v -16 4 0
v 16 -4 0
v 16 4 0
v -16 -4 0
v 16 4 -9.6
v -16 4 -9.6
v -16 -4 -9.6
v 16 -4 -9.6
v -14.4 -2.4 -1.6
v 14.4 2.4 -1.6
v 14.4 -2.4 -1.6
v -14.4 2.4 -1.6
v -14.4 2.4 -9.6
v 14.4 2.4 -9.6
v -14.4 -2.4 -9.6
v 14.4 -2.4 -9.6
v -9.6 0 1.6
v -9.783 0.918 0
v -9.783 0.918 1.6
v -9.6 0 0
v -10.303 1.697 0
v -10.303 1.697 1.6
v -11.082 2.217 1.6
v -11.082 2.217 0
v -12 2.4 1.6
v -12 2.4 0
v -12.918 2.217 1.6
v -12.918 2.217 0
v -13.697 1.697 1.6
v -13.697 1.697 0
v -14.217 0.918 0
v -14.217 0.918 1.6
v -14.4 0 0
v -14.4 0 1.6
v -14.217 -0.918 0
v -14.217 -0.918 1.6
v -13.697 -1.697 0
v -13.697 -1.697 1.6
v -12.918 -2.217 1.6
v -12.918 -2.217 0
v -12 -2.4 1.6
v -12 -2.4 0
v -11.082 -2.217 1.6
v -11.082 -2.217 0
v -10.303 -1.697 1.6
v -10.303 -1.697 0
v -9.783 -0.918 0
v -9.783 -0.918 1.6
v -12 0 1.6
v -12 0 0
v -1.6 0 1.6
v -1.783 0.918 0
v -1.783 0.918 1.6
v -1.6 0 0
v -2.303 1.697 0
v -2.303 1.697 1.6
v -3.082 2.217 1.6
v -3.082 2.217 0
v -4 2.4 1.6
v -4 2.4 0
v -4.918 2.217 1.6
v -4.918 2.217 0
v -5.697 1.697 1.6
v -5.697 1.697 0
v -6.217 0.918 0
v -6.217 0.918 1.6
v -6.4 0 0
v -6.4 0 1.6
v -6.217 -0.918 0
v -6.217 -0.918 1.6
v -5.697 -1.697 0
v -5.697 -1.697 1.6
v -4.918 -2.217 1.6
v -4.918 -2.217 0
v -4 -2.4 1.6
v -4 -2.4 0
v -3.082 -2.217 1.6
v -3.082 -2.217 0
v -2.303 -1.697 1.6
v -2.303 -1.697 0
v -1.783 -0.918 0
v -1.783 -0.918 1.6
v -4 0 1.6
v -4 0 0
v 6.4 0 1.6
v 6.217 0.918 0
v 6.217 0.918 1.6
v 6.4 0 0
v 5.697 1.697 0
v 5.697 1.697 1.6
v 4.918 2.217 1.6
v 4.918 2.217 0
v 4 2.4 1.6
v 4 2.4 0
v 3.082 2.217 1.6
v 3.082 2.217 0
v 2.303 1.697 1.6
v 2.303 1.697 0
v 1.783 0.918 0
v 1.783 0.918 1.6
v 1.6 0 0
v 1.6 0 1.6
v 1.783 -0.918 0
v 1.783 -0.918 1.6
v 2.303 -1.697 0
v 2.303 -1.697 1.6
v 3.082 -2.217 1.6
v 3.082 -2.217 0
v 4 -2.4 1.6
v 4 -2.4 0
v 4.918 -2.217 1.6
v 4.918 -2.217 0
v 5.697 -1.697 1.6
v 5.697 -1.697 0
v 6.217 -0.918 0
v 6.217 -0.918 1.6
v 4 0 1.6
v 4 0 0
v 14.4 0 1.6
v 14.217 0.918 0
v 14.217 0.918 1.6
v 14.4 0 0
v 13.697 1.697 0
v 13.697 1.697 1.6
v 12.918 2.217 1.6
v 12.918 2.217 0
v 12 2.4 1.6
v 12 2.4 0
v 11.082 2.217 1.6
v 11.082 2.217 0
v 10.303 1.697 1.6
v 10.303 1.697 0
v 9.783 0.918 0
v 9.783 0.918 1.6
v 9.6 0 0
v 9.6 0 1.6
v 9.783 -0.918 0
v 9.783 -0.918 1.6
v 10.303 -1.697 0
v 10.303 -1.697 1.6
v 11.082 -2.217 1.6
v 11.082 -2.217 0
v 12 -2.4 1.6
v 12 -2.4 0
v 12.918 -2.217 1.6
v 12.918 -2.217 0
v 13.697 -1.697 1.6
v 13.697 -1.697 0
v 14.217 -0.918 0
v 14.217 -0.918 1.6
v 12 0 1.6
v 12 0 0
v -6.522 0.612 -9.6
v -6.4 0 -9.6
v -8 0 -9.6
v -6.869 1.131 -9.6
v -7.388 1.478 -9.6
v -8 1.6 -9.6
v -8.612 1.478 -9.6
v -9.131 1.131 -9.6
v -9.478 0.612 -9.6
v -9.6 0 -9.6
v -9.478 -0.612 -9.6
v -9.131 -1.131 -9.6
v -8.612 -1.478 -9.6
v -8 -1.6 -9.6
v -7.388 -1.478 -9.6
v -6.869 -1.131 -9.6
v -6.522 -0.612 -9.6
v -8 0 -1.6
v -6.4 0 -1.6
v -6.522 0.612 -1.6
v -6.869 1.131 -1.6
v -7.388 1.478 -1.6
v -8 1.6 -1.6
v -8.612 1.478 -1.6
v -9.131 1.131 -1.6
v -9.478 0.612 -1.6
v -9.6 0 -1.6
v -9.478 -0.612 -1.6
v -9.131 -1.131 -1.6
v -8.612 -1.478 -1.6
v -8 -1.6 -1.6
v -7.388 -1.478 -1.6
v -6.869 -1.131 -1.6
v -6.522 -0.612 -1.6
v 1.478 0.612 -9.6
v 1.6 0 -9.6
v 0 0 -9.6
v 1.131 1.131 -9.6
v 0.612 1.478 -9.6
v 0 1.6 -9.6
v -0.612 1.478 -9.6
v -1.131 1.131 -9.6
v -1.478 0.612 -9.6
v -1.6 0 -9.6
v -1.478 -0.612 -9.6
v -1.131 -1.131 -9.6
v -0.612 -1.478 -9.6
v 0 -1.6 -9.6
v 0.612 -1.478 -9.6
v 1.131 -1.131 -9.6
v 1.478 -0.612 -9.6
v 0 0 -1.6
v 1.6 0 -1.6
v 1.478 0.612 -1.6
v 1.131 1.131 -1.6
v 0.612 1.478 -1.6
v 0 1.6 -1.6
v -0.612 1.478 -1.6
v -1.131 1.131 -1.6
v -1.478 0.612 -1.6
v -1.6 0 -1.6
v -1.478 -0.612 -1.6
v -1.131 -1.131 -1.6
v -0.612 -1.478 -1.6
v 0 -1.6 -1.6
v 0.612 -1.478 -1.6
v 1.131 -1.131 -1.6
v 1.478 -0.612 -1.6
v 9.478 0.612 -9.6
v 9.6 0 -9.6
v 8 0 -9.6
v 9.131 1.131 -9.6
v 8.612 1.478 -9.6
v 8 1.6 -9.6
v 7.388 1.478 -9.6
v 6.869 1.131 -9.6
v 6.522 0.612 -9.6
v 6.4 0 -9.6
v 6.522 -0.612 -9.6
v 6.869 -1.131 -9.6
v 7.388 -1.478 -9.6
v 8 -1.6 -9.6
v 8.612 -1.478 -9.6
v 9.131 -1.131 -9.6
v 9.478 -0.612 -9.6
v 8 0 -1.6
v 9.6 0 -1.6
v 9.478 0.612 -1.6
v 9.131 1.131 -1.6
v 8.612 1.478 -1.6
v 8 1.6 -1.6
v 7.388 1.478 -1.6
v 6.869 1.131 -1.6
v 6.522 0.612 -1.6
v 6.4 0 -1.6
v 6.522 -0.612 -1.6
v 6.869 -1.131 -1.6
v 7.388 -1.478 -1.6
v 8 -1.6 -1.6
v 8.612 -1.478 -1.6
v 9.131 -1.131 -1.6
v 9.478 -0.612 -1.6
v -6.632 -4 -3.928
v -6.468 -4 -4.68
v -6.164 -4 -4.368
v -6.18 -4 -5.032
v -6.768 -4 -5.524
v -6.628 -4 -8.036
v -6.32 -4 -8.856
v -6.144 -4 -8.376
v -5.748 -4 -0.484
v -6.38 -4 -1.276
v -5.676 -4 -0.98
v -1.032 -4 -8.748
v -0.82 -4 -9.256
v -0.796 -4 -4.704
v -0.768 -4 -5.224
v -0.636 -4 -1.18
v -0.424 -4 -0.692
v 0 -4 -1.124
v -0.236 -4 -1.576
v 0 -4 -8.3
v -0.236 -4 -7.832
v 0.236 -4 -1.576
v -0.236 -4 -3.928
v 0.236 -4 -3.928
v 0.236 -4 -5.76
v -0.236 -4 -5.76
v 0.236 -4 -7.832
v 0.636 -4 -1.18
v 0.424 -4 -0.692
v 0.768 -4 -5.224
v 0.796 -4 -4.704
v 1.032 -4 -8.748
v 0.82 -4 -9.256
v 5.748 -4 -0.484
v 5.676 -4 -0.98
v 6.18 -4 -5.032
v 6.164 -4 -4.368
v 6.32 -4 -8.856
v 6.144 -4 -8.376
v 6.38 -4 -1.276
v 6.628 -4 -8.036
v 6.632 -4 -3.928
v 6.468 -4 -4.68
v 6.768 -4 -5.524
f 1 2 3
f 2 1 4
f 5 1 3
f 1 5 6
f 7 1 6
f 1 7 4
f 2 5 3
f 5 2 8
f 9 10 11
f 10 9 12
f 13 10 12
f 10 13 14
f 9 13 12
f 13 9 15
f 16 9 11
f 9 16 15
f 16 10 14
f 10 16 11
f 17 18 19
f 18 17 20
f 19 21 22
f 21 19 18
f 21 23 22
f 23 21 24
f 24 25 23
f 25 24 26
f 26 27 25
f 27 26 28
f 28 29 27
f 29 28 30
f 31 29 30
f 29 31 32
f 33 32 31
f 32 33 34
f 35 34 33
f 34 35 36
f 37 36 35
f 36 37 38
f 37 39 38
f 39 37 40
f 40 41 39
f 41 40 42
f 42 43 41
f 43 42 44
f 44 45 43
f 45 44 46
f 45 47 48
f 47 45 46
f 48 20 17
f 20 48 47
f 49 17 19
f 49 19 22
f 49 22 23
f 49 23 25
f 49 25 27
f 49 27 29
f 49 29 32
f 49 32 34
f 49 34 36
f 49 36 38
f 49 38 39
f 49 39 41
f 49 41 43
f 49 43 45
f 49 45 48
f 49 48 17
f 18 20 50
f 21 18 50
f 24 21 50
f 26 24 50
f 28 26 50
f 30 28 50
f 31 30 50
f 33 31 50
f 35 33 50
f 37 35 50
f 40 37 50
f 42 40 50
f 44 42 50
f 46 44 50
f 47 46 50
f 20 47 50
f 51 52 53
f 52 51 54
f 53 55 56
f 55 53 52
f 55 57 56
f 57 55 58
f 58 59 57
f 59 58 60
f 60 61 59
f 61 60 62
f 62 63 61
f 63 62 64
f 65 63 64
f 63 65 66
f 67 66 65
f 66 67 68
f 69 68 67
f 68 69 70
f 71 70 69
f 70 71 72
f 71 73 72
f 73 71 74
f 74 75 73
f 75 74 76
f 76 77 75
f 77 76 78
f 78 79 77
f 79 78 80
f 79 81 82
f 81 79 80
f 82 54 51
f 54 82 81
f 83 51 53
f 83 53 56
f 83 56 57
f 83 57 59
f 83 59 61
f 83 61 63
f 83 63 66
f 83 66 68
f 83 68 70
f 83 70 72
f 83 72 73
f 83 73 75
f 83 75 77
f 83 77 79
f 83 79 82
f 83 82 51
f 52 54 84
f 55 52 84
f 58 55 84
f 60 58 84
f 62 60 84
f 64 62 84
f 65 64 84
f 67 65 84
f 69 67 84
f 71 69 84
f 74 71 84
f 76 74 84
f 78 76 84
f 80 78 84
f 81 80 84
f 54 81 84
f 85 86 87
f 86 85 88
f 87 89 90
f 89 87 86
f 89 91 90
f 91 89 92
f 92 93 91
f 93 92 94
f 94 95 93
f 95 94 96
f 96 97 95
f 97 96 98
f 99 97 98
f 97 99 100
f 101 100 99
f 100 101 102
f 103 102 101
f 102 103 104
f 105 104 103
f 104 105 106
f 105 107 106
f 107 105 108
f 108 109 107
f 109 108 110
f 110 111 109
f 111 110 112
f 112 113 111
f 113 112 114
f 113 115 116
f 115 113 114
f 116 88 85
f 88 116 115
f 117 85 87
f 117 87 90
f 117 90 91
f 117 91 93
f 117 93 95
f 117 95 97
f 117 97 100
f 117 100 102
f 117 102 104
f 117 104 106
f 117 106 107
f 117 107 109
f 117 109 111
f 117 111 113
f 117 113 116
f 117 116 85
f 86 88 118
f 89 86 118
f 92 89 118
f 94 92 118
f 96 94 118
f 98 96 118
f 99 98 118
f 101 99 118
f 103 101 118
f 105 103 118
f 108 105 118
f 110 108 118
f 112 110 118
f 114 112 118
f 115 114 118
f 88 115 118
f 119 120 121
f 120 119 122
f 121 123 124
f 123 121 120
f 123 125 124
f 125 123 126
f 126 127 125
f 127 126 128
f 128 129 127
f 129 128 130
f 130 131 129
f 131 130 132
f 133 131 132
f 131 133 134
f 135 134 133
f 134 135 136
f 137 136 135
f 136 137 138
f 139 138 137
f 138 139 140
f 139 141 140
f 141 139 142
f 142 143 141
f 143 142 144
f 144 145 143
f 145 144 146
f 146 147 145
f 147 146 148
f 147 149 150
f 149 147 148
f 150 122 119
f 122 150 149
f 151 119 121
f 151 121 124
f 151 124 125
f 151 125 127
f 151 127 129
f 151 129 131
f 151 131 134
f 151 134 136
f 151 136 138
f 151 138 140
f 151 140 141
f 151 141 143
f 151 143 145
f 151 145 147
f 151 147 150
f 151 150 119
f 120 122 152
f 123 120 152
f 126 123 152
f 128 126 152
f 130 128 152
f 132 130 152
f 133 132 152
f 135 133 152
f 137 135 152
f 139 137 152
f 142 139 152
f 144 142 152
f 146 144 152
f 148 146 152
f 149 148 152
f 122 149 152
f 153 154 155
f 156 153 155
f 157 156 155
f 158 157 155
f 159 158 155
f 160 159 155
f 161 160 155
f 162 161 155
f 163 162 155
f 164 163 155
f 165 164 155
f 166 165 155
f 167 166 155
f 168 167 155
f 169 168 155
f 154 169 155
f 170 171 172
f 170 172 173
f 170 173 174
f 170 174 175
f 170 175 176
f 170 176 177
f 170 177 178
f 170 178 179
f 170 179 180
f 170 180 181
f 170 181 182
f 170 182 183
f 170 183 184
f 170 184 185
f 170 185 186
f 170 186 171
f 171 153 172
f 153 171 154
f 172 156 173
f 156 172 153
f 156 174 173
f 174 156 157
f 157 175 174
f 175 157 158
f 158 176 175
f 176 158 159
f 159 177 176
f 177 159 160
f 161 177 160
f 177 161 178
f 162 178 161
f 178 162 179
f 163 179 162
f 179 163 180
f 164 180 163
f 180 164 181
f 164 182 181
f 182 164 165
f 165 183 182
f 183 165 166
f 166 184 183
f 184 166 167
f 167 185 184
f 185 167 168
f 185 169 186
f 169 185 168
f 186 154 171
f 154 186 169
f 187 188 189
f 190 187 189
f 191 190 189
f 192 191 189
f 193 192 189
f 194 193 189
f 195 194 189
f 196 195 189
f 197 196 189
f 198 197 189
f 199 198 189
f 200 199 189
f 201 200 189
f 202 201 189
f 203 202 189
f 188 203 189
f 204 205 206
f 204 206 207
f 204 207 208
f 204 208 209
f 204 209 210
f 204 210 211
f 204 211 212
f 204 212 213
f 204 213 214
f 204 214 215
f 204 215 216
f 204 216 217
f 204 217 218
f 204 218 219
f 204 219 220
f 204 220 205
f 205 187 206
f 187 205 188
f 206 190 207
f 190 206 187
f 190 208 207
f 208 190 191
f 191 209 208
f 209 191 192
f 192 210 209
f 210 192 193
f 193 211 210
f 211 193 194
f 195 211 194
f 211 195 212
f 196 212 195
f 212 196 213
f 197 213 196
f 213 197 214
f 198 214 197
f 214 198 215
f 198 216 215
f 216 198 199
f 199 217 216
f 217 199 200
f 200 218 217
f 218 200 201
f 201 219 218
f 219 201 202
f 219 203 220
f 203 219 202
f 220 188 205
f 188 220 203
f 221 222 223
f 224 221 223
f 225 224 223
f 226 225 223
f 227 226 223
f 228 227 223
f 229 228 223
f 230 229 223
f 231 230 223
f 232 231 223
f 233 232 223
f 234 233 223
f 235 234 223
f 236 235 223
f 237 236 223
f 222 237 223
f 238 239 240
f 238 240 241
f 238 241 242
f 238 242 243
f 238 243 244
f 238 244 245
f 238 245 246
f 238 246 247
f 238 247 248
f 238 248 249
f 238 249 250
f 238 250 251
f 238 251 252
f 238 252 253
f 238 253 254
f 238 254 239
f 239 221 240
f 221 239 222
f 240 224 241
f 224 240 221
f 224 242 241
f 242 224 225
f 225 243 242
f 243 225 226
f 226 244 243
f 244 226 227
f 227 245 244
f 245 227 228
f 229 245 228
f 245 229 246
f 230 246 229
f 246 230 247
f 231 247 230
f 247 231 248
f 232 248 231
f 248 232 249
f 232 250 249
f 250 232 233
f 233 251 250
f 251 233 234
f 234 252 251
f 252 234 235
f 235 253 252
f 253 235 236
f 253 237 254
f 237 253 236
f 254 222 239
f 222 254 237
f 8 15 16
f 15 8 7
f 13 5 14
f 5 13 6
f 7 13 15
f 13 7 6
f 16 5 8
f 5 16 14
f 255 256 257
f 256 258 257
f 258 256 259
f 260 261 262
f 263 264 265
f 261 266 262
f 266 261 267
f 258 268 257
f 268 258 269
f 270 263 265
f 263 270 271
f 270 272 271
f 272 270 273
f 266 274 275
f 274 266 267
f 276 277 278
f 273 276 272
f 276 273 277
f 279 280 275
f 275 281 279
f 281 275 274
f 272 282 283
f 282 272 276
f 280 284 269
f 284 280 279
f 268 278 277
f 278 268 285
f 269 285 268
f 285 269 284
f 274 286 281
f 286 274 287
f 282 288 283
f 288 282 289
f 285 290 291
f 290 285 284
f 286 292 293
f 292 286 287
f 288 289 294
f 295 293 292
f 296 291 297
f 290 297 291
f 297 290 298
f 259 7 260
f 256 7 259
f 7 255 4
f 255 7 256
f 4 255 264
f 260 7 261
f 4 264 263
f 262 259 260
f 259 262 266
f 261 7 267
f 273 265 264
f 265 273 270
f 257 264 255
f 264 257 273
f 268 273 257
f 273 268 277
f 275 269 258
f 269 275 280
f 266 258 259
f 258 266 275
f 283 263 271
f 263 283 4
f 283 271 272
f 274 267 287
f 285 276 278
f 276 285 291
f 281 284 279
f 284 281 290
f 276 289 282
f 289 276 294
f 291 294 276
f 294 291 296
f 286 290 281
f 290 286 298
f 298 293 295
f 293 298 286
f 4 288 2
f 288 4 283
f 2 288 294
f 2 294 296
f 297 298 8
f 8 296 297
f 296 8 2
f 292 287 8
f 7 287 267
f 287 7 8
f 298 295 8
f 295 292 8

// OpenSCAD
// file: ../p/4-4edge.scad
use <../lib.scad>
function ldraw_lib__4_4edge() = [
// 0 Circle 1.0
// 0 Name: 4-4edge.dat
// 0 Author: James Jessiman
// 0 !LDRAW_ORG Primitive UPDATE 2017-01
// 0 !LICENSE Licensed under CC BY 2.0 and CC BY 4.0 : see CAreadme.txt
// 
// 0 BFC CERTIFY CCW
  [0,"BFC","CERTIFY"],
  [0,"BFC","CCW"],
// 
// 0 !HISTORY 1998-12-15 [PTadmin] Official Update 1998-10
// 0 !HISTORY 2005-12-28 [PTadmin] Official Update 2005-01
// 0 !HISTORY 2007-06-24 [PTadmin] Header formatted for Contributor Agreement
// 0 !HISTORY 2008-07-01 [PTadmin] Official Update 2008-01
// 0 !HISTORY 2017-01-15 [Steffen] BFCed
// 0 !HISTORY 2017-12-30 [PTadmin] Official Update 2017-01
// 
// 
// 2 24 1 0 0 0.9239 0 0.3827
  [2,24,1,0,0,0.9239,0,0.3827],
// 2 24 0.9239 0 0.3827 0.7071 0 0.7071
  [2,24,0.9239,0,0.3827,0.7071,0,0.7071],
// 2 24 0.7071 0 0.7071 0.3827 0 0.9239
  [2,24,0.7071,0,0.7071,0.3827,0,0.9239],
// 2 24 0.3827 0 0.9239 0 0 1
  [2,24,0.3827,0,0.9239,0,0,1],
// 2 24 0 0 1 -0.3827 0 0.9239
  [2,24,0,0,1,-0.3827,0,0.9239],
// 2 24 -0.3827 0 0.9239 -0.7071 0 0.7071
  [2,24,-0.3827,0,0.9239,-0.7071,0,0.7071],
// 2 24 -0.7071 0 0.7071 -0.9239 0 0.3827
  [2,24,-0.7071,0,0.7071,-0.9239,0,0.3827],
// 2 24 -0.9239 0 0.3827 -1 0 -0
  [2,24,-0.9239,0,0.3827,-1,0,-0],
// 2 24 -1 0 -0 -0.9239 0 -0.3827
  [2,24,-1,0,-0,-0.9239,0,-0.3827],
// 2 24 -0.9239 0 -0.3827 -0.7071 0 -0.7071
  [2,24,-0.9239,0,-0.3827,-0.7071,0,-0.7071],
// 2 24 -0.7071 0 -0.7071 -0.3827 0 -0.9239
  [2,24,-0.7071,0,-0.7071,-0.3827,0,-0.9239],
// 2 24 -0.3827 0 -0.9239 0 0 -1
  [2,24,-0.3827,0,-0.9239,0,0,-1],
// 2 24 0 0 -1 0.3827 0 -0.9239
  [2,24,0,0,-1,0.3827,0,-0.9239],
// 2 24 0.3827 0 -0.9239 0.7071 0 -0.7071
  [2,24,0.3827,0,-0.9239,0.7071,0,-0.7071],
// 2 24 0.7071 0 -0.7071 0.9239 0 -0.3827
  [2,24,0.7071,0,-0.7071,0.9239,0,-0.3827],
// 2 24 0.9239 0 -0.3827 1 0 0
  [2,24,0.9239,0,-0.3827,1,0,0],
];
module ldraw_lib__4_4edge(step=0, col=false, unit=2/5, alt=false, line=0.2, solid=!$preview)
    makepoly(ldraw_lib__4_4edge(), step=step, col=col, unit=unit, alt=alt, line=line, solid=solid);
ldraw_lib__4_4edge(line=0.2);
// file: ../p/4-4disc.scad
use <../lib.scad>
function ldraw_lib__4_4disc() = [
// 0 Disc 1.0
// 0 Name: 4-4disc.dat
// 0 Author: James Jessiman
// 0 !LDRAW_ORG Primitive UPDATE 2002-02
// 0 !LICENSE Licensed under CC BY 2.0 and CC BY 4.0 : see CAreadme.txt
// 
// 0 BFC CERTIFY CCW
  [0,"BFC","CERTIFY"],
  [0,"BFC","CCW"],
// 
// 0 !HISTORY 1998-12-15 [PTadmin] Official Update 1998-10
// 0 !HISTORY 2002-03-23 [sbliss] Added BFC statement
// 0 !HISTORY 2002-04-25 [PTadmin] Official Update 2002-02
// 0 !HISTORY 2007-06-24 [PTadmin] Header formatted for Contributor Agreement
// 0 !HISTORY 2008-07-01 [PTadmin] Official Update 2008-01
// 
// 
// 3 16 0 0 0 1 0 0 0.9239 0 0.3827
  [3,16,0,0,0,1,0,0,0.9239,0,0.3827],
// 3 16 0 0 0 0.9239 0 0.3827 0.7071 0 0.7071
  [3,16,0,0,0,0.9239,0,0.3827,0.7071,0,0.7071],
// 3 16 0 0 0 0.7071 0 0.7071 0.3827 0 0.9239
  [3,16,0,0,0,0.7071,0,0.7071,0.3827,0,0.9239],
// 3 16 0 0 0 0.3827 0 0.9239 0 0 1
  [3,16,0,0,0,0.3827,0,0.9239,0,0,1],
// 3 16 0 0 0 0 0 1 -0.3827 0 0.9239
  [3,16,0,0,0,0,0,1,-0.3827,0,0.9239],
// 3 16 0 0 0 -0.3827 0 0.9239 -0.7071 0 0.7071
  [3,16,0,0,0,-0.3827,0,0.9239,-0.7071,0,0.7071],
// 3 16 0 0 0 -0.7071 0 0.7071 -0.9239 0 0.3827
  [3,16,0,0,0,-0.7071,0,0.7071,-0.9239,0,0.3827],
// 3 16 0 0 0 -0.9239 0 0.3827 -1 0 -0
  [3,16,0,0,0,-0.9239,0,0.3827,-1,0,-0],
// 3 16 0 0 0 -1 0 -0 -0.9239 0 -0.3827
  [3,16,0,0,0,-1,0,-0,-0.9239,0,-0.3827],
// 3 16 0 0 0 -0.9239 0 -0.3827 -0.7071 0 -0.7071
  [3,16,0,0,0,-0.9239,0,-0.3827,-0.7071,0,-0.7071],
// 3 16 0 0 0 -0.7071 0 -0.7071 -0.3827 0 -0.9239
  [3,16,0,0,0,-0.7071,0,-0.7071,-0.3827,0,-0.9239],
// 3 16 0 0 0 -0.3827 0 -0.9239 0 0 -1
  [3,16,0,0,0,-0.3827,0,-0.9239,0,0,-1],
// 3 16 0 0 0 0 0 -1 0.3827 0 -0.9239
  [3,16,0,0,0,0,0,-1,0.3827,0,-0.9239],
// 3 16 0 0 0 0.3827 0 -0.9239 0.7071 0 -0.7071
  [3,16,0,0,0,0.3827,0,-0.9239,0.7071,0,-0.7071],
// 3 16 0 0 0 0.7071 0 -0.7071 0.9239 0 -0.3827
  [3,16,0,0,0,0.7071,0,-0.7071,0.9239,0,-0.3827],
// 3 16 0 0 0 0.9239 0 -0.3827 1 0 0
  [3,16,0,0,0,0.9239,0,-0.3827,1,0,0],
// 0
];
module ldraw_lib__4_4disc(step=0, col=false, unit=2/5, alt=false, line=0.2, solid=!$preview)
    makepoly(ldraw_lib__4_4disc(), step=step, col=col, unit=unit, alt=alt, line=line, solid=solid);
ldraw_lib__4_4disc(line=0.2);
// file: ../p/4-4cyli.scad
use <../lib.scad>
$fa=1; $fs=0.2;
function ldraw_lib__4_4cyli(realsolid=false) = [
// 0 Cylinder 1.0
// 0 Name: 4-4cyli.dat
// 0 Author: James Jessiman
// 0 !LDRAW_ORG Primitive UPDATE 2005-01
// 0 !LICENSE Licensed under CC BY 2.0 and CC BY 4.0 : see CAreadme.txt
// 
// 0 BFC CERTIFY CCW
  [0,"BFC","CERTIFY"],
  [0,"BFC","CCW"],
// 
// 0 !HISTORY 1998-12-15 [PTadmin] Official Update 1998-10
// 0 !HISTORY 2002-03-23 [sbliss] Added BFC statement; merged headers from files in distributions LDraw 0.27 and Complete.
// 0 !HISTORY 2002-04-25 [PTadmin] Official Update 2002-02
// 0 !HISTORY 2004-12-14 [guyvivan] BFC CCW
// 0 !HISTORY 2005-12-28 [PTadmin] Official Update 2005-01
// 0 !HISTORY 2007-06-24 [PTadmin] Header formatted for Contributor Agreement
// 0 !HISTORY 2008-07-01 [PTadmin] Official Update 2008-01
// 
// 
// 4 16 1 1 0 0.9239 1 0.3827 0.9239 0 0.3827 1 0 0
  [4,16,1,1,0,0.9239,1,0.3827,0.9239,0,0.3827,1,0,0],
// 5 24 1 0 0 1 1 0 0.9239 0 0.3827 0.9239 0 -0.3827
  [5,24,1,0,0,1,1,0,0.9239,0,0.3827,0.9239,0,-0.3827],
// 4 16 0.9239 1 0.3827 0.7071 1 0.7071 0.7071 0 0.7071 0.9239 0 0.3827
  [4,16,0.9239,1,0.3827,0.7071,1,0.7071,0.7071,0,0.7071,0.9239,0,0.3827],
// 5 24 0.9239 0 0.3827 0.9239 1 0.3827 0.7071 0 0.7071 1 0 0
  [5,24,0.9239,0,0.3827,0.9239,1,0.3827,0.7071,0,0.7071,1,0,0],
// 4 16 0.7071 1 0.7071 0.3827 1 0.9239 0.3827 0 0.9239 0.7071 0 0.7071
  [4,16,0.7071,1,0.7071,0.3827,1,0.9239,0.3827,0,0.9239,0.7071,0,0.7071],
// 5 24 0.7071 0 0.7071 0.7071 1 0.7071 0.3827 0 0.9239 0.9239 0 0.3827
  [5,24,0.7071,0,0.7071,0.7071,1,0.7071,0.3827,0,0.9239,0.9239,0,0.3827],
// 4 16 0.3827 1 0.9239 0 1 1 0 0 1 0.3827 0 0.9239
  [4,16,0.3827,1,0.9239,0,1,1,0,0,1,0.3827,0,0.9239],
// 5 24 0.3827 0 0.9239 0.3827 1 0.9239 0 0 1 0.7071 0 0.7071
  [5,24,0.3827,0,0.9239,0.3827,1,0.9239,0,0,1,0.7071,0,0.7071],
// 4 16 0 1 1 -0.3827 1 0.9239 -0.3827 0 0.9239 0 0 1
  [4,16,0,1,1,-0.3827,1,0.9239,-0.3827,0,0.9239,0,0,1],
// 5 24 0 0 1 0 1 1 -0.3827 0 0.9239 0.3827 0 0.9239
  [5,24,0,0,1,0,1,1,-0.3827,0,0.9239,0.3827,0,0.9239],
// 4 16 -0.3827 1 0.9239 -0.7071 1 0.7071 -0.7071 0 0.7071 -0.3827 0 0.9239
  [4,16,-0.3827,1,0.9239,-0.7071,1,0.7071,-0.7071,0,0.7071,-0.3827,0,0.9239],
// 5 24 -0.3827 0 0.9239 -0.3827 1 0.9239 -0.7071 0 0.7071 0 0 1
  [5,24,-0.3827,0,0.9239,-0.3827,1,0.9239,-0.7071,0,0.7071,0,0,1],
// 4 16 -0.7071 1 0.7071 -0.9239 1 0.3827 -0.9239 0 0.3827 -0.7071 0 0.7071
  [4,16,-0.7071,1,0.7071,-0.9239,1,0.3827,-0.9239,0,0.3827,-0.7071,0,0.7071],
// 5 24 -0.7071 0 0.7071 -0.7071 1 0.7071 -0.9239 0 0.3827 -0.3827 0 0.9239
  [5,24,-0.7071,0,0.7071,-0.7071,1,0.7071,-0.9239,0,0.3827,-0.3827,0,0.9239],
// 4 16 -0.9239 1 0.3827 -1 1 0 -1 0 0 -0.9239 0 0.3827
  [4,16,-0.9239,1,0.3827,-1,1,0,-1,0,0,-0.9239,0,0.3827],
// 5 24 -0.9239 0 0.3827 -0.9239 1 0.3827 -1 0 0 -0.7071 0 0.7071
  [5,24,-0.9239,0,0.3827,-0.9239,1,0.3827,-1,0,0,-0.7071,0,0.7071],
// 4 16 -1 1 0 -0.9239 1 -0.3827 -0.9239 0 -0.3827 -1 0 0
  [4,16,-1,1,0,-0.9239,1,-0.3827,-0.9239,0,-0.3827,-1,0,0],
// 5 24 -1 0 0 -1 1 0 -0.9239 0 -0.3827 -0.9239 0 0.3827
  [5,24,-1,0,0,-1,1,0,-0.9239,0,-0.3827,-0.9239,0,0.3827],
// 4 16 -0.9239 1 -0.3827 -0.7071 1 -0.7071 -0.7071 0 -0.7071 -0.9239 0 -0.3827
  [4,16,-0.9239,1,-0.3827,-0.7071,1,-0.7071,-0.7071,0,-0.7071,-0.9239,0,-0.3827],
// 5 24 -0.9239 0 -0.3827 -0.9239 1 -0.3827 -0.7071 0 -0.7071 -1 0 0
  [5,24,-0.9239,0,-0.3827,-0.9239,1,-0.3827,-0.7071,0,-0.7071,-1,0,0],
// 4 16 -0.7071 1 -0.7071 -0.3827 1 -0.9239 -0.3827 0 -0.9239 -0.7071 0 -0.7071
  [4,16,-0.7071,1,-0.7071,-0.3827,1,-0.9239,-0.3827,0,-0.9239,-0.7071,0,-0.7071],
// 5 24 -0.7071 0 -0.7071 -0.7071 1 -0.7071 -0.3827 0 -0.9239 -0.9239 0 -0.3827
  [5,24,-0.7071,0,-0.7071,-0.7071,1,-0.7071,-0.3827,0,-0.9239,-0.9239,0,-0.3827],
// 4 16 -0.3827 1 -0.9239 0 1 -1 0 0 -1 -0.3827 0 -0.9239
  [4,16,-0.3827,1,-0.9239,0,1,-1,0,0,-1,-0.3827,0,-0.9239],
// 5 24 -0.3827 0 -0.9239 -0.3827 1 -0.9239 0 0 -1 -0.7071 0 -0.7071
  [5,24,-0.3827,0,-0.9239,-0.3827,1,-0.9239,0,0,-1,-0.7071,0,-0.7071],
// 4 16 0 1 -1 0.3827 1 -0.9239 0.3827 0 -0.9239 0 0 -1
  [4,16,0,1,-1,0.3827,1,-0.9239,0.3827,0,-0.9239,0,0,-1],
// 5 24 0 0 -1 0 1 -1 0.3827 0 -0.9239 -0.3827 0 -0.9239
  [5,24,0,0,-1,0,1,-1,0.3827,0,-0.9239,-0.3827,0,-0.9239],
// 4 16 0.3827 1 -0.9239 0.7071 1 -0.7071 0.7071 0 -0.7071 0.3827 0 -0.9239
  [4,16,0.3827,1,-0.9239,0.7071,1,-0.7071,0.7071,0,-0.7071,0.3827,0,-0.9239],
// 5 24 0.3827 0 -0.9239 0.3827 1 -0.9239 0.7071 0 -0.7071 0 0 -1
  [5,24,0.3827,0,-0.9239,0.3827,1,-0.9239,0.7071,0,-0.7071,0,0,-1],
// 4 16 0.7071 1 -0.7071 0.9239 1 -0.3827 0.9239 0 -0.3827 0.7071 0 -0.7071
  [4,16,0.7071,1,-0.7071,0.9239,1,-0.3827,0.9239,0,-0.3827,0.7071,0,-0.7071],
// 5 24 0.7071 0 -0.7071 0.7071 1 -0.7071 0.9239 0 -0.3827 0.3827 0 -0.9239
  [5,24,0.7071,0,-0.7071,0.7071,1,-0.7071,0.9239,0,-0.3827,0.3827,0,-0.9239],
// 4 16 0.9239 1 -0.3827 1 1 0 1 0 0 0.9239 0 -0.3827
  [4,16,0.9239,1,-0.3827,1,1,0,1,0,0,0.9239,0,-0.3827],
// 5 24 0.9239 0 -0.3827 0.9239 1 -0.3827 1 0 0 0.7071 0 -0.7071
  [5,24,0.9239,0,-0.3827,0.9239,1,-0.3827,1,0,0,0.7071,0,-0.7071],
// 0
];
module ldraw_lib__4_4cyli(step=0, col=false, unit=2/5, alt=false, line=0.2, solid=!$preview)
    makepoly(ldraw_lib__4_4cyli(solid), step=step, col=col, unit=unit, alt=alt, line=line, solid=solid);
ldraw_lib__4_4cyli(line=0.2);
// file: ../p/stud3.scad
use <../lib.scad>
use <4-4cyli.scad>
use <4-4disc.scad>
use <4-4edge.scad>
function ldraw_lib__stud3() = [
// 0 Stud Tube Solid
// 0 Name: stud3.dat
// 0 Author: James Jessiman
// 0 !LDRAW_ORG Primitive UPDATE 2012-01
// 0 !LICENSE Licensed under CC BY 4.0 : see CAreadme.txt
// 
// 0 BFC CERTIFY CCW
  [0,"BFC","CERTIFY"],
  [0,"BFC","CCW"],
// 
// 0 !HISTORY 2002-04-04 [sbliss] Modified for BFC compliance
// 0 !HISTORY 2002-04-25 [PTadmin] Official Update 2002-02
// 0 !HISTORY 2007-06-24 [PTadmin] Header formatted for Contributor Agreement
// 0 !HISTORY 2008-07-01 [PTadmin] Official Update 2008-01
// 0 !HISTORY 2012-02-16 [Philo] Changed to CCW
// 0 !HISTORY 2012-03-30 [PTadmin] Official Update 2012-01
// 
// 
// 1 16 0 -4 0 4 0 0 0 1 0 0 0 4 4-4edge.dat
  [1,16,0,-4,0,4,0,0,0,1,0,0,0,4, ldraw_lib__4_4edge()],
// 1 16 0 0 0 4 0 0 0 1 0 0 0 4 4-4edge.dat
  [1,16,0,0,0,4,0,0,0,1,0,0,0,4, ldraw_lib__4_4edge()],
// 1 16 0 -4 0 4 0 0 0 1 0 0 0 4 4-4disc.dat
  [1,16,0,-4,0,4,0,0,0,1,0,0,0,4, ldraw_lib__4_4disc()],
  [-1,16,0,0,0,4,0,0,0,-1,0,0,0,4, ldraw_lib__4_4disc()],
// 1 16 0 -4 0 4 0 0 0 4 0 0 0 4 4-4cyli.dat
  [1,16,0,-4,0,4,0,0,0,4,0,0,0,4, ldraw_lib__4_4cyli()],
];
module ldraw_lib__stud3(step=0, col=false, unit=2/5, alt=false, line=0.2, solid=!$preview)
    makepoly(ldraw_lib__stud3(), step=step, col=col, unit=unit, alt=alt, line=line, solid=solid);
ldraw_lib__stud3(line=0.2);
// file: ../p/stud.scad
use <../lib.scad>
use <4-4cyli.scad>
use <4-4disc.scad>
use <4-4edge.scad>
function ldraw_lib__stud() = [
// 0 Stud
// 0 Name: stud.dat
// 0 Author: James Jessiman
// 0 !LDRAW_ORG Primitive UPDATE 2012-01
// 0 !LICENSE Licensed under CC BY 4.0 : see CAreadme.txt
// 
// 0 BFC CERTIFY CCW
  [0,"BFC","CERTIFY"],
  [0,"BFC","CCW"],
// 
// 0 !HISTORY 2002-04-04 [sbliss] Modified for BFC compliance
// 0 !HISTORY 2002-04-25 [PTadmin] Official Update 2002-02
// 0 !HISTORY 2007-06-24 [PTadmin] Header formatted for Contributor Agreement
// 0 !HISTORY 2008-07-01 [PTadmin] Official Update 2008-01
// 0 !HISTORY 2012-02-16 [Philo] Changed to CCW
// 0 !HISTORY 2012-03-30 [PTadmin] Official Update 2012-01
// 
// 
// 1 16 0 0 0 6 0 0 0 1 0 0 0 6 4-4edge.dat
  [1,16,0,0,0,6,0,0,0,1,0,0,0,6, ldraw_lib__4_4edge()],
// 1 16 0 -4 0 6 0 0 0 1 0 0 0 6 4-4edge.dat
  [1,16,0,-4,0,6,0,0,0,1,0,0,0,6, ldraw_lib__4_4edge()],
// 1 16 0 0 0 6 0 0 0 -4 0 0 0 6 4-4cyli.dat
  [1,16,0,0,0,6,0,0,0,-4,0,0,0,6, ldraw_lib__4_4cyli()],
// 1 16 0 -4 0 6 0 0 0 1 0 0 0 6 4-4disc.dat
  [1,16,0,-4,0,6,0,0,0,1,0,0,0,6, ldraw_lib__4_4disc()],
  [-1,16,0,0,0,6,0,0,0,-1,0,0,0,6, ldraw_lib__4_4disc()],
];
module ldraw_lib__stud(step=0, col=false, unit=2/5, alt=false, line=0.2, solid=!$preview)
    makepoly(ldraw_lib__stud(), step=step, col=col, unit=unit, alt=alt, line=line, solid=solid);
ldraw_lib__stud(line=0.2);
// file: ../p/box5.scad
use <../lib.scad>
function ldraw_lib__box5() = [
// 0 Box with 5 Faces and All Edges
// 0 Name: box5.dat
// 0 Author: James Jessiman
// 0 !LDRAW_ORG Primitive UPDATE 2012-01
// 0 !LICENSE Licensed under CC BY 2.0 and CC BY 4.0 : see CAreadme.txt
// 
// 0 BFC CERTIFY CCW
  [0,"BFC","CERTIFY"],
  [0,"BFC","CCW"],
// 
// 0 !HISTORY 2002-04-03 [sbliss] Modified for BFC compliance
// 0 !HISTORY 2002-04-25 [PTadmin] Official Update 2002-02
// 0 !HISTORY 2007-06-24 [PTadmin] Header formatted for Contributor Agreement
// 0 !HISTORY 2008-07-01 [PTadmin] Official Update 2008-01
// 0 !HISTORY 2012-02-16 [Philo] Changed to CCW
// 0 !HISTORY 2012-03-30 [PTadmin] Official Update 2012-01
// 
// 
// 2 24 1 1 1 -1 1 1
  [2,24,1,1,1,-1,1,1],
// 2 24 -1 1 1 -1 1 -1
  [2,24,-1,1,1,-1,1,-1],
// 2 24 -1 1 -1 1 1 -1
  [2,24,-1,1,-1,1,1,-1],
// 2 24 1 1 -1 1 1 1
  [2,24,1,1,-1,1,1,1],
// 2 24 1 0 1 -1 0 1
  [2,24,1,0,1,-1,0,1],
// 2 24 -1 0 1 -1 0 -1
  [2,24,-1,0,1,-1,0,-1],
// 2 24 -1 0 -1 1 0 -1
  [2,24,-1,0,-1,1,0,-1],
// 2 24 1 0 -1 1 0 1
  [2,24,1,0,-1,1,0,1],
// 2 24 1 0 1 1 1 1
  [2,24,1,0,1,1,1,1],
// 2 24 -1 0 1 -1 1 1
  [2,24,-1,0,1,-1,1,1],
// 2 24 1 0 -1 1 1 -1
  [2,24,1,0,-1,1,1,-1],
// 2 24 -1 0 -1 -1 1 -1
  [2,24,-1,0,-1,-1,1,-1],
// 4 16 -1 1 1 1 1 1 1 1 -1 -1 1 -1
  [4,16,-1,1,1,1,1,1,1,1,-1,-1,1,-1],
// 4 16 -1 1 1 -1 0 1 1 0 1 1 1 1
  [4,16,-1,1,1,-1,0,1,1,0,1,1,1,1],
// 4 16 -1 1 -1 -1 0 -1 -1 0 1 -1 1 1
  [4,16,-1,1,-1,-1,0,-1,-1,0,1,-1,1,1],
// 4 16 1 1 -1 1 0 -1 -1 0 -1 -1 1 -1
  [4,16,1,1,-1,1,0,-1,-1,0,-1,-1,1,-1],
// 4 16 1 1 1 1 0 1 1 0 -1 1 1 -1
  [4,16,1,1,1,1,0,1,1,0,-1,1,1,-1],
];
makepoly(ldraw_lib__box5(), line=0.2);
// file: ../p/box4t.scad
use <../lib.scad>
function ldraw_lib__box4t() = [
// 0 Box with 4 Adjacent Faces and All Edges
// 0 Name: box4t.dat
// 0 Author: Tore Eriksson [Tore_Eriksson]
// 0 !LDRAW_ORG Primitive UPDATE 2003-02
// 0 !LICENSE Licensed under CC BY 2.0 and CC BY 4.0 : see CAreadme.txt
// 
// 0 BFC CERTIFY CCW
  [0,"BFC","CERTIFY"],
  [0,"BFC","CCW"],
// 
// 0 !HISTORY 1997-09-29 [PTadmin] Official Update 1997-15
// 0 !HISTORY 2002-08-31 [izanette] Modified with WINDZ for BFC compliance
// 0 !HISTORY 2003-08-01 [PTadmin] Official Update 2003-02
// 0 !HISTORY 2007-06-24 [PTadmin] Header formatted for Contributor Agreement
// 0 !HISTORY 2008-07-01 [PTadmin] Official Update 2008-01
// 
// 
// 2 24 1 1 1 -1 1 1
  [2,24,1,1,1,-1,1,1],
// 2 24 -1 1 1 -1 1 -1
  [2,24,-1,1,1,-1,1,-1],
// 2 24 -1 1 -1 1 1 -1
  [2,24,-1,1,-1,1,1,-1],
// 2 24 1 1 -1 1 1 1
  [2,24,1,1,-1,1,1,1],
// 2 24 1 0 1 -1 0 1
  [2,24,1,0,1,-1,0,1],
// 2 24 -1 0 1 -1 0 -1
  [2,24,-1,0,1,-1,0,-1],
// 2 24 -1 0 -1 1 0 -1
  [2,24,-1,0,-1,1,0,-1],
// 2 24 1 0 -1 1 0 1
  [2,24,1,0,-1,1,0,1],
// 2 24 1 0 1 1 1 1
  [2,24,1,0,1,1,1,1],
// 2 24 -1 0 1 -1 1 1
  [2,24,-1,0,1,-1,1,1],
// 2 24 1 0 -1 1 1 -1
  [2,24,1,0,-1,1,1,-1],
// 2 24 -1 0 -1 -1 1 -1
  [2,24,-1,0,-1,-1,1,-1],
// 4 16 1 1 1 1 1 -1 -1 1 -1 -1 1 1
  [4,16,1,1,1,1,1,-1,-1,1,-1,-1,1,1],
// 4 16 1 1 1 -1 1 1 -1 0 1 1 0 1
  [4,16,1,1,1,-1,1,1,-1,0,1,1,0,1],
// 4 16 -1 1 1 -1 1 -1 -1 0 -1 -1 0 1
  [4,16,-1,1,1,-1,1,-1,-1,0,-1,-1,0,1],
// 0 4 16 -1 1 -1 -1 0 -1 1 0 -1 1 1 -1
// 4 16 1 1 -1 1 1 1 1 0 1 1 0 -1
  [4,16,1,1,-1,1,1,1,1,0,1,1,0,-1],
// 0
];
makepoly(ldraw_lib__box4t(), line=0.2);
// file: s/3010s01.scad
use <../../lib.scad>
use <../../p/box4t.scad>
use <../../p/box5.scad>
use <../../p/stud.scad>
use <../../p/stud3.scad>
$fa=1; $fs=0.2;
function ldraw_lib__s__3010s01(realsolid=false) = [
// 0 ~Brick  1 x  4 without Front Face
// 0 Name: s\3010s01.dat
// 0 Author: Tony Hafner [hafhead]
// 0 !LDRAW_ORG Subpart UPDATE 2003-02
// 0 !LICENSE Licensed under CC BY 2.0 and CC BY 4.0 : see CAreadme.txt
// 
// 0 BFC CERTIFY CW
  [0,"BFC","CERTIFY"],
  [0,"BFC","CW"],
// 
// 0 !HISTORY 2003-08-01 [PTadmin] Official Update 2003-02
// 0 !HISTORY 2007-08-29 [PTadmin] Header formatted for Contributor Agreement
// 0 !HISTORY 2008-07-01 [PTadmin] Official Update 2008-01
// 
// 
// 1 16 0 24 0 40 0 0 0 -24 0 0 0 10 box4t.dat
  [1,16,0,24,0,40,0,0,0,-24,0,0,0,10, ldraw_lib__box4t(realsolid)],
// 0 BFC INVERTNEXT
  [0,"BFC","INVERTNEXT"],
// 1 16 0 24 0 36 0 0 0 -20 0 0 0 6 box5.dat
  [1,16,0,24,0,36,0,0,0,-20,0,0,0,6, ldraw_lib__box5(realsolid)],
// 1 16 -30 0 0 1 0 0 0 1 0 0 0 1 stud.dat
  [1,16,-30,0,0,1,0,0,0,1,0,0,0,1, ldraw_lib__stud(realsolid)],
// 1 16 -10 0 0 1 0 0 0 1 0 0 0 1 stud.dat
  [1,16,-10,0,0,1,0,0,0,1,0,0,0,1, ldraw_lib__stud(realsolid)],
// 1 16 10 0 0 1 0 0 0 1 0 0 0 1 stud.dat
  [1,16,10,0,0,1,0,0,0,1,0,0,0,1, ldraw_lib__stud(realsolid)],
// 1 16 30 0 0 1 0 0 0 1 0 0 0 1 stud.dat
  [1,16,30,0,0,1,0,0,0,1,0,0,0,1, ldraw_lib__stud(realsolid)],
// 1 16 -20 4 0 1 0 0 0 -5 0 0 0 1 stud3.dat
  [1,16,-20,4,0,1,0,0,0,-5,0,0,0,1, ldraw_lib__stud3(realsolid)],
// 1 16 0 4 0 1 0 0 0 -5 0 0 0 1 stud3.dat
  [1,16,0,4,0,1,0,0,0,-5,0,0,0,1, ldraw_lib__stud3(realsolid)],
// 1 16 20 4 0 1 0 0 0 -5 0 0 0 1 stud3.dat
  [1,16,20,4,0,1,0,0,0,-5,0,0,0,1, ldraw_lib__stud3(realsolid)],
// 4 16 -40 24 -10 40 24 -10 36 24 -6 -36 24 -6
  [4,16,-40,24,-10,40,24,-10,36,24,-6,-36,24,-6],
// 4 16 -40 24 10 -36 24 6 36 24 6 40 24 10
  [4,16,-40,24,10,-36,24,6,36,24,6,40,24,10],
// 4 16 -40 24 -10 -36 24 -6 -36 24 6 -40 24 10
  [4,16,-40,24,-10,-36,24,-6,-36,24,6,-40,24,10],
// 4 16 40 24 -10 40 24 10 36 24 6 36 24 -6
  [4,16,40,24,-10,40,24,10,36,24,6,36,24,-6],
// 0
];
module ldraw_lib__s__3010s01(step=0, col=false, unit=2/5, alt=false, line=0.2, solid=!$preview)
    makepoly(ldraw_lib__s__3010s01(solid), step=step, col=col, unit=unit, alt=alt, line=line, solid=solid);
ldraw_lib__s__3010s01(line=0.2);
// main file
use <../lib.scad>
use <s/3010s01.scad>
function ldraw_lib__3010pz7() = [
// 0 Brick  1 x  4 with Black Abdominal Muscles Pattern
// 0 Name: 3010pz7.dat
// 0 Author: Damien Roux [Darats]
// 0 !LDRAW_ORG Part UPDATE 2017-01
// 0 !LICENSE Licensed under CC BY 4.0 : see CAreadme.txt
// 
// 0 BFC CERTIFY CCW
  [0,"BFC","CERTIFY"],
  [0,"BFC","CCW"],
// 
// 0 !KEYWORDS Brickheadz, BrickLink 3010pb205, Rebrickable 3010pr0021, Set 41592
// 0 !KEYWORDS The Hulk
// 
// 0 !HISTORY 2017-12-30 [PTadmin] Official Update 2017-01
// 
// 
// 1 16 0 0 0 1 0 0 0 1 0 0 0 1 s\3010s01.dat
  [1,16,0,0,0,1,0,0,0,1,0,0,0,1, ldraw_lib__s__3010s01()],
// 3 0 -16.58 9.82 -10 -16.17 11.7 -10 -15.41 10.92 -10
  [3,0,-16.58,9.82,-10,-16.17,11.7,-10,-15.41,10.92,-10],
// 4 0 -15.45 12.58 -10 -15.41 10.92 -10 -16.17 11.7 -10 -16.92 13.81 -10
  [4,0,-15.45,12.58,-10,-15.41,10.92,-10,-16.17,11.7,-10,-16.92,13.81,-10],
// 3 0 -16.57 20.09 -10 -15.8 22.14 -10 -15.36 20.94 -10
  [3,0,-16.57,20.09,-10,-15.8,22.14,-10,-15.36,20.94,-10],
// 3 0 -14.37 1.21 -10 -15.95 3.19 -10 -14.19 2.45 -10
  [3,0,-14.37,1.21,-10,-15.95,3.19,-10,-14.19,2.45,-10],
// 4 0 -15.36 20.94 -10 -15.8 22.14 -10 -2.05 23.14 -10 -2.58 21.87 -10
  [4,0,-15.36,20.94,-10,-15.8,22.14,-10,-2.05,23.14,-10,-2.58,21.87,-10],
// 4 0 -1.99 11.76 -10 -15.41 10.92 -10 -15.45 12.58 -10 -1.92 13.06 -10
  [4,0,-1.99,11.76,-10,-15.41,10.92,-10,-15.45,12.58,-10,-1.92,13.06,-10],
// 4 0 -1.06 1.73 -10 -14.37 1.21 -10 -14.19 2.45 -10 -1.59 2.95 -10
  [4,0,-1.06,1.73,-10,-14.37,1.21,-10,-14.19,2.45,-10,-1.59,2.95,-10],
// 4 0 -0.59 3.94 -10 0 2.81 -10 -1.06 1.73 -10 -1.59 2.95 -10
  [4,0,-0.59,3.94,-10,0,2.81,-10,-1.06,1.73,-10,-1.59,2.95,-10],
// 4 0 -0.59 19.58 -10 -2.58 21.87 -10 -2.05 23.14 -10 0 20.75 -10
  [4,0,-0.59,19.58,-10,-2.58,21.87,-10,-2.05,23.14,-10,0,20.75,-10],
// 3 0 0.59 3.94 -10 -0.59 9.82 -10 0.59 9.82 -10
  [3,0,0.59,3.94,-10,-0.59,9.82,-10,0.59,9.82,-10],
// 4 0 0.59 3.94 -10 0 2.81 -10 -0.59 3.94 -10 -0.59 9.82 -10
  [4,0,0.59,3.94,-10,0,2.81,-10,-0.59,3.94,-10,-0.59,9.82,-10],
// 3 0 0.59 14.4 -10 -0.59 14.4 -10 -0.59 19.58 -10
  [3,0,0.59,14.4,-10,-0.59,14.4,-10,-0.59,19.58,-10],
// 4 0 -0.59 19.58 -10 0 20.75 -10 0.59 19.58 -10 0.59 14.4 -10
  [4,0,-0.59,19.58,-10,0,20.75,-10,0.59,19.58,-10,0.59,14.4,-10],
// 4 0 1.06 1.73 -10 0 2.81 -10 0.59 3.94 -10 1.59 2.95 -10
  [4,0,1.06,1.73,-10,0,2.81,-10,0.59,3.94,-10,1.59,2.95,-10],
// 4 0 1.92 13.06 -10 -1.92 13.06 -10 -0.59 14.4 -10 0.59 14.4 -10
  [4,0,1.92,13.06,-10,-1.92,13.06,-10,-0.59,14.4,-10,0.59,14.4,-10],
// 4 0 0.59 9.82 -10 -0.59 9.82 -10 -1.99 11.76 -10 1.99 11.76 -10
  [4,0,0.59,9.82,-10,-0.59,9.82,-10,-1.99,11.76,-10,1.99,11.76,-10],
// 4 0 1.99 11.76 -10 -1.99 11.76 -10 -1.92 13.06 -10 1.92 13.06 -10
  [4,0,1.99,11.76,-10,-1.99,11.76,-10,-1.92,13.06,-10,1.92,13.06,-10],
// 4 0 2.05 23.14 -10 2.58 21.87 -10 0.59 19.58 -10 0 20.75 -10
  [4,0,2.05,23.14,-10,2.58,21.87,-10,0.59,19.58,-10,0,20.75,-10],
// 4 0 14.19 2.45 -10 14.37 1.21 -10 1.06 1.73 -10 1.59 2.95 -10
  [4,0,14.19,2.45,-10,14.37,1.21,-10,1.06,1.73,-10,1.59,2.95,-10],
// 4 0 15.45 12.58 -10 15.41 10.92 -10 1.99 11.76 -10 1.92 13.06 -10
  [4,0,15.45,12.58,-10,15.41,10.92,-10,1.99,11.76,-10,1.92,13.06,-10],
// 4 0 2.05 23.14 -10 15.8 22.14 -10 15.36 20.94 -10 2.58 21.87 -10
  [4,0,2.05,23.14,-10,15.8,22.14,-10,15.36,20.94,-10,2.58,21.87,-10],
// 3 0 14.37 1.21 -10 14.19 2.45 -10 15.95 3.19 -10
  [3,0,14.37,1.21,-10,14.19,2.45,-10,15.95,3.19,-10],
// 3 0 16.57 20.09 -10 15.36 20.94 -10 15.8 22.14 -10
  [3,0,16.57,20.09,-10,15.36,20.94,-10,15.8,22.14,-10],
// 3 0 16.58 9.82 -10 15.41 10.92 -10 16.17 11.7 -10
  [3,0,16.58,9.82,-10,15.41,10.92,-10,16.17,11.7,-10],
// 4 0 16.17 11.7 -10 15.41 10.92 -10 15.45 12.58 -10 16.92 13.81 -10
  [4,0,16.17,11.7,-10,15.41,10.92,-10,15.45,12.58,-10,16.92,13.81,-10],
// 3 16 -16.92 13.81 -10 -40 24 -10 -16.57 20.09 -10
  [3,16,-16.92,13.81,-10,-40,24,-10,-16.57,20.09,-10],
// 3 16 -16.17 11.7 -10 -40 24 -10 -16.92 13.81 -10
  [3,16,-16.17,11.7,-10,-40,24,-10,-16.92,13.81,-10],
// 4 16 -16.17 11.7 -10 -16.58 9.82 -10 -40 0 -10 -40 24 -10
  [4,16,-16.17,11.7,-10,-16.58,9.82,-10,-40,0,-10,-40,24,-10],
// 3 16 -40 0 -10 -16.58 9.82 -10 -15.95 3.19 -10
  [3,16,-40,0,-10,-16.58,9.82,-10,-15.95,3.19,-10],
// 3 16 -16.57 20.09 -10 -40 24 -10 -15.8 22.14 -10
  [3,16,-16.57,20.09,-10,-40,24,-10,-15.8,22.14,-10],
// 3 16 -40 0 -10 -15.95 3.19 -10 -14.37 1.21 -10
  [3,16,-40,0,-10,-15.95,3.19,-10,-14.37,1.21,-10],
// 4 16 -15.36 20.94 -10 -2.58 21.87 -10 -16.92 13.81 -10 -16.57 20.09 -10
  [4,16,-15.36,20.94,-10,-2.58,21.87,-10,-16.92,13.81,-10,-16.57,20.09,-10],
// 3 16 -15.8 22.14 -10 -40 24 -10 -2.05 23.14 -10
  [3,16,-15.8,22.14,-10,-40,24,-10,-2.05,23.14,-10],
// 4 16 -0.59 3.94 -10 -1.59 2.95 -10 -14.19 2.45 -10 -15.95 3.19 -10
  [4,16,-0.59,3.94,-10,-1.59,2.95,-10,-14.19,2.45,-10,-15.95,3.19,-10],
// 4 16 -15.41 10.92 -10 -0.59 3.94 -10 -15.95 3.19 -10 -16.58 9.82 -10
  [4,16,-15.41,10.92,-10,-0.59,3.94,-10,-15.95,3.19,-10,-16.58,9.82,-10],
// 4 16 -15.41 10.92 -10 -1.99 11.76 -10 -0.59 9.82 -10 -0.59 3.94 -10
  [4,16,-15.41,10.92,-10,-1.99,11.76,-10,-0.59,9.82,-10,-0.59,3.94,-10],
// 4 16 -0.59 14.4 -10 -1.92 13.06 -10 -15.45 12.58 -10 -0.59 19.58 -10
  [4,16,-0.59,14.4,-10,-1.92,13.06,-10,-15.45,12.58,-10,-0.59,19.58,-10],
// 4 16 -2.58 21.87 -10 -0.59 19.58 -10 -15.45 12.58 -10 -16.92 13.81 -10
  [4,16,-2.58,21.87,-10,-0.59,19.58,-10,-15.45,12.58,-10,-16.92,13.81,-10],
// 4 16 -40 0 -10 -14.37 1.21 -10 -1.06 1.73 -10 1.06 1.73 -10
  [4,16,-40,0,-10,-14.37,1.21,-10,-1.06,1.73,-10,1.06,1.73,-10],
// 3 16 1.06 1.73 -10 -1.06 1.73 -10 0 2.81 -10
  [3,16,1.06,1.73,-10,-1.06,1.73,-10,0,2.81,-10],
// 3 16 0 20.75 -10 -2.05 23.14 -10 2.05 23.14 -10
  [3,16,0,20.75,-10,-2.05,23.14,-10,2.05,23.14,-10],
// 4 16 15.41 10.92 -10 0.59 3.94 -10 0.59 9.82 -10 1.99 11.76 -10
  [4,16,15.41,10.92,-10,0.59,3.94,-10,0.59,9.82,-10,1.99,11.76,-10],
// 4 16 15.45 12.58 -10 1.92 13.06 -10 0.59 14.4 -10 0.59 19.58 -10
  [4,16,15.45,12.58,-10,1.92,13.06,-10,0.59,14.4,-10,0.59,19.58,-10],
// 4 16 14.19 2.45 -10 1.59 2.95 -10 0.59 3.94 -10 15.95 3.19 -10
  [4,16,14.19,2.45,-10,1.59,2.95,-10,0.59,3.94,-10,15.95,3.19,-10],
// 4 16 15.95 3.19 -10 0.59 3.94 -10 15.41 10.92 -10 16.58 9.82 -10
  [4,16,15.95,3.19,-10,0.59,3.94,-10,15.41,10.92,-10,16.58,9.82,-10],
// 4 16 15.45 12.58 -10 0.59 19.58 -10 2.58 21.87 -10 16.92 13.81 -10
  [4,16,15.45,12.58,-10,0.59,19.58,-10,2.58,21.87,-10,16.92,13.81,-10],
// 4 16 16.92 13.81 -10 2.58 21.87 -10 15.36 20.94 -10 16.57 20.09 -10
  [4,16,16.92,13.81,-10,2.58,21.87,-10,15.36,20.94,-10,16.57,20.09,-10],
// 4 16 40 0 -10 -40 0 -10 1.06 1.73 -10 14.37 1.21 -10
  [4,16,40,0,-10,-40,0,-10,1.06,1.73,-10,14.37,1.21,-10],
// 3 16 40 0 -10 14.37 1.21 -10 15.95 3.19 -10
  [3,16,40,0,-10,14.37,1.21,-10,15.95,3.19,-10],
// 3 16 40 0 -10 15.95 3.19 -10 16.58 9.82 -10
  [3,16,40,0,-10,15.95,3.19,-10,16.58,9.82,-10],
// 3 16 16.17 11.7 -10 16.92 13.81 -10 40 24 -10
  [3,16,16.17,11.7,-10,16.92,13.81,-10,40,24,-10],
// 4 16 40 0 -10 16.58 9.82 -10 16.17 11.7 -10 40 24 -10
  [4,16,40,0,-10,16.58,9.82,-10,16.17,11.7,-10,40,24,-10],
// 3 16 15.8 22.14 -10 2.05 23.14 -10 40 24 -10
  [3,16,15.8,22.14,-10,2.05,23.14,-10,40,24,-10],
// 4 16 2.05 23.14 -10 -2.05 23.14 -10 -40 24 -10 40 24 -10
  [4,16,2.05,23.14,-10,-2.05,23.14,-10,-40,24,-10,40,24,-10],
// 3 16 16.92 13.81 -10 16.57 20.09 -10 40 24 -10
  [3,16,16.92,13.81,-10,16.57,20.09,-10,40,24,-10],
// 3 16 16.57 20.09 -10 15.8 22.14 -10 40 24 -10
  [3,16,16.57,20.09,-10,15.8,22.14,-10,40,24,-10],
];
module ldraw_lib__3010pz7(step=0, col=false, unit=2/5, alt=false, line=0.2, solid=!$preview)
    makepoly(ldraw_lib__3010pz7(), step=step, col=col, unit=unit, alt=alt, line=line, solid=solid);
ldraw_lib__3010pz7(line=0.2);
